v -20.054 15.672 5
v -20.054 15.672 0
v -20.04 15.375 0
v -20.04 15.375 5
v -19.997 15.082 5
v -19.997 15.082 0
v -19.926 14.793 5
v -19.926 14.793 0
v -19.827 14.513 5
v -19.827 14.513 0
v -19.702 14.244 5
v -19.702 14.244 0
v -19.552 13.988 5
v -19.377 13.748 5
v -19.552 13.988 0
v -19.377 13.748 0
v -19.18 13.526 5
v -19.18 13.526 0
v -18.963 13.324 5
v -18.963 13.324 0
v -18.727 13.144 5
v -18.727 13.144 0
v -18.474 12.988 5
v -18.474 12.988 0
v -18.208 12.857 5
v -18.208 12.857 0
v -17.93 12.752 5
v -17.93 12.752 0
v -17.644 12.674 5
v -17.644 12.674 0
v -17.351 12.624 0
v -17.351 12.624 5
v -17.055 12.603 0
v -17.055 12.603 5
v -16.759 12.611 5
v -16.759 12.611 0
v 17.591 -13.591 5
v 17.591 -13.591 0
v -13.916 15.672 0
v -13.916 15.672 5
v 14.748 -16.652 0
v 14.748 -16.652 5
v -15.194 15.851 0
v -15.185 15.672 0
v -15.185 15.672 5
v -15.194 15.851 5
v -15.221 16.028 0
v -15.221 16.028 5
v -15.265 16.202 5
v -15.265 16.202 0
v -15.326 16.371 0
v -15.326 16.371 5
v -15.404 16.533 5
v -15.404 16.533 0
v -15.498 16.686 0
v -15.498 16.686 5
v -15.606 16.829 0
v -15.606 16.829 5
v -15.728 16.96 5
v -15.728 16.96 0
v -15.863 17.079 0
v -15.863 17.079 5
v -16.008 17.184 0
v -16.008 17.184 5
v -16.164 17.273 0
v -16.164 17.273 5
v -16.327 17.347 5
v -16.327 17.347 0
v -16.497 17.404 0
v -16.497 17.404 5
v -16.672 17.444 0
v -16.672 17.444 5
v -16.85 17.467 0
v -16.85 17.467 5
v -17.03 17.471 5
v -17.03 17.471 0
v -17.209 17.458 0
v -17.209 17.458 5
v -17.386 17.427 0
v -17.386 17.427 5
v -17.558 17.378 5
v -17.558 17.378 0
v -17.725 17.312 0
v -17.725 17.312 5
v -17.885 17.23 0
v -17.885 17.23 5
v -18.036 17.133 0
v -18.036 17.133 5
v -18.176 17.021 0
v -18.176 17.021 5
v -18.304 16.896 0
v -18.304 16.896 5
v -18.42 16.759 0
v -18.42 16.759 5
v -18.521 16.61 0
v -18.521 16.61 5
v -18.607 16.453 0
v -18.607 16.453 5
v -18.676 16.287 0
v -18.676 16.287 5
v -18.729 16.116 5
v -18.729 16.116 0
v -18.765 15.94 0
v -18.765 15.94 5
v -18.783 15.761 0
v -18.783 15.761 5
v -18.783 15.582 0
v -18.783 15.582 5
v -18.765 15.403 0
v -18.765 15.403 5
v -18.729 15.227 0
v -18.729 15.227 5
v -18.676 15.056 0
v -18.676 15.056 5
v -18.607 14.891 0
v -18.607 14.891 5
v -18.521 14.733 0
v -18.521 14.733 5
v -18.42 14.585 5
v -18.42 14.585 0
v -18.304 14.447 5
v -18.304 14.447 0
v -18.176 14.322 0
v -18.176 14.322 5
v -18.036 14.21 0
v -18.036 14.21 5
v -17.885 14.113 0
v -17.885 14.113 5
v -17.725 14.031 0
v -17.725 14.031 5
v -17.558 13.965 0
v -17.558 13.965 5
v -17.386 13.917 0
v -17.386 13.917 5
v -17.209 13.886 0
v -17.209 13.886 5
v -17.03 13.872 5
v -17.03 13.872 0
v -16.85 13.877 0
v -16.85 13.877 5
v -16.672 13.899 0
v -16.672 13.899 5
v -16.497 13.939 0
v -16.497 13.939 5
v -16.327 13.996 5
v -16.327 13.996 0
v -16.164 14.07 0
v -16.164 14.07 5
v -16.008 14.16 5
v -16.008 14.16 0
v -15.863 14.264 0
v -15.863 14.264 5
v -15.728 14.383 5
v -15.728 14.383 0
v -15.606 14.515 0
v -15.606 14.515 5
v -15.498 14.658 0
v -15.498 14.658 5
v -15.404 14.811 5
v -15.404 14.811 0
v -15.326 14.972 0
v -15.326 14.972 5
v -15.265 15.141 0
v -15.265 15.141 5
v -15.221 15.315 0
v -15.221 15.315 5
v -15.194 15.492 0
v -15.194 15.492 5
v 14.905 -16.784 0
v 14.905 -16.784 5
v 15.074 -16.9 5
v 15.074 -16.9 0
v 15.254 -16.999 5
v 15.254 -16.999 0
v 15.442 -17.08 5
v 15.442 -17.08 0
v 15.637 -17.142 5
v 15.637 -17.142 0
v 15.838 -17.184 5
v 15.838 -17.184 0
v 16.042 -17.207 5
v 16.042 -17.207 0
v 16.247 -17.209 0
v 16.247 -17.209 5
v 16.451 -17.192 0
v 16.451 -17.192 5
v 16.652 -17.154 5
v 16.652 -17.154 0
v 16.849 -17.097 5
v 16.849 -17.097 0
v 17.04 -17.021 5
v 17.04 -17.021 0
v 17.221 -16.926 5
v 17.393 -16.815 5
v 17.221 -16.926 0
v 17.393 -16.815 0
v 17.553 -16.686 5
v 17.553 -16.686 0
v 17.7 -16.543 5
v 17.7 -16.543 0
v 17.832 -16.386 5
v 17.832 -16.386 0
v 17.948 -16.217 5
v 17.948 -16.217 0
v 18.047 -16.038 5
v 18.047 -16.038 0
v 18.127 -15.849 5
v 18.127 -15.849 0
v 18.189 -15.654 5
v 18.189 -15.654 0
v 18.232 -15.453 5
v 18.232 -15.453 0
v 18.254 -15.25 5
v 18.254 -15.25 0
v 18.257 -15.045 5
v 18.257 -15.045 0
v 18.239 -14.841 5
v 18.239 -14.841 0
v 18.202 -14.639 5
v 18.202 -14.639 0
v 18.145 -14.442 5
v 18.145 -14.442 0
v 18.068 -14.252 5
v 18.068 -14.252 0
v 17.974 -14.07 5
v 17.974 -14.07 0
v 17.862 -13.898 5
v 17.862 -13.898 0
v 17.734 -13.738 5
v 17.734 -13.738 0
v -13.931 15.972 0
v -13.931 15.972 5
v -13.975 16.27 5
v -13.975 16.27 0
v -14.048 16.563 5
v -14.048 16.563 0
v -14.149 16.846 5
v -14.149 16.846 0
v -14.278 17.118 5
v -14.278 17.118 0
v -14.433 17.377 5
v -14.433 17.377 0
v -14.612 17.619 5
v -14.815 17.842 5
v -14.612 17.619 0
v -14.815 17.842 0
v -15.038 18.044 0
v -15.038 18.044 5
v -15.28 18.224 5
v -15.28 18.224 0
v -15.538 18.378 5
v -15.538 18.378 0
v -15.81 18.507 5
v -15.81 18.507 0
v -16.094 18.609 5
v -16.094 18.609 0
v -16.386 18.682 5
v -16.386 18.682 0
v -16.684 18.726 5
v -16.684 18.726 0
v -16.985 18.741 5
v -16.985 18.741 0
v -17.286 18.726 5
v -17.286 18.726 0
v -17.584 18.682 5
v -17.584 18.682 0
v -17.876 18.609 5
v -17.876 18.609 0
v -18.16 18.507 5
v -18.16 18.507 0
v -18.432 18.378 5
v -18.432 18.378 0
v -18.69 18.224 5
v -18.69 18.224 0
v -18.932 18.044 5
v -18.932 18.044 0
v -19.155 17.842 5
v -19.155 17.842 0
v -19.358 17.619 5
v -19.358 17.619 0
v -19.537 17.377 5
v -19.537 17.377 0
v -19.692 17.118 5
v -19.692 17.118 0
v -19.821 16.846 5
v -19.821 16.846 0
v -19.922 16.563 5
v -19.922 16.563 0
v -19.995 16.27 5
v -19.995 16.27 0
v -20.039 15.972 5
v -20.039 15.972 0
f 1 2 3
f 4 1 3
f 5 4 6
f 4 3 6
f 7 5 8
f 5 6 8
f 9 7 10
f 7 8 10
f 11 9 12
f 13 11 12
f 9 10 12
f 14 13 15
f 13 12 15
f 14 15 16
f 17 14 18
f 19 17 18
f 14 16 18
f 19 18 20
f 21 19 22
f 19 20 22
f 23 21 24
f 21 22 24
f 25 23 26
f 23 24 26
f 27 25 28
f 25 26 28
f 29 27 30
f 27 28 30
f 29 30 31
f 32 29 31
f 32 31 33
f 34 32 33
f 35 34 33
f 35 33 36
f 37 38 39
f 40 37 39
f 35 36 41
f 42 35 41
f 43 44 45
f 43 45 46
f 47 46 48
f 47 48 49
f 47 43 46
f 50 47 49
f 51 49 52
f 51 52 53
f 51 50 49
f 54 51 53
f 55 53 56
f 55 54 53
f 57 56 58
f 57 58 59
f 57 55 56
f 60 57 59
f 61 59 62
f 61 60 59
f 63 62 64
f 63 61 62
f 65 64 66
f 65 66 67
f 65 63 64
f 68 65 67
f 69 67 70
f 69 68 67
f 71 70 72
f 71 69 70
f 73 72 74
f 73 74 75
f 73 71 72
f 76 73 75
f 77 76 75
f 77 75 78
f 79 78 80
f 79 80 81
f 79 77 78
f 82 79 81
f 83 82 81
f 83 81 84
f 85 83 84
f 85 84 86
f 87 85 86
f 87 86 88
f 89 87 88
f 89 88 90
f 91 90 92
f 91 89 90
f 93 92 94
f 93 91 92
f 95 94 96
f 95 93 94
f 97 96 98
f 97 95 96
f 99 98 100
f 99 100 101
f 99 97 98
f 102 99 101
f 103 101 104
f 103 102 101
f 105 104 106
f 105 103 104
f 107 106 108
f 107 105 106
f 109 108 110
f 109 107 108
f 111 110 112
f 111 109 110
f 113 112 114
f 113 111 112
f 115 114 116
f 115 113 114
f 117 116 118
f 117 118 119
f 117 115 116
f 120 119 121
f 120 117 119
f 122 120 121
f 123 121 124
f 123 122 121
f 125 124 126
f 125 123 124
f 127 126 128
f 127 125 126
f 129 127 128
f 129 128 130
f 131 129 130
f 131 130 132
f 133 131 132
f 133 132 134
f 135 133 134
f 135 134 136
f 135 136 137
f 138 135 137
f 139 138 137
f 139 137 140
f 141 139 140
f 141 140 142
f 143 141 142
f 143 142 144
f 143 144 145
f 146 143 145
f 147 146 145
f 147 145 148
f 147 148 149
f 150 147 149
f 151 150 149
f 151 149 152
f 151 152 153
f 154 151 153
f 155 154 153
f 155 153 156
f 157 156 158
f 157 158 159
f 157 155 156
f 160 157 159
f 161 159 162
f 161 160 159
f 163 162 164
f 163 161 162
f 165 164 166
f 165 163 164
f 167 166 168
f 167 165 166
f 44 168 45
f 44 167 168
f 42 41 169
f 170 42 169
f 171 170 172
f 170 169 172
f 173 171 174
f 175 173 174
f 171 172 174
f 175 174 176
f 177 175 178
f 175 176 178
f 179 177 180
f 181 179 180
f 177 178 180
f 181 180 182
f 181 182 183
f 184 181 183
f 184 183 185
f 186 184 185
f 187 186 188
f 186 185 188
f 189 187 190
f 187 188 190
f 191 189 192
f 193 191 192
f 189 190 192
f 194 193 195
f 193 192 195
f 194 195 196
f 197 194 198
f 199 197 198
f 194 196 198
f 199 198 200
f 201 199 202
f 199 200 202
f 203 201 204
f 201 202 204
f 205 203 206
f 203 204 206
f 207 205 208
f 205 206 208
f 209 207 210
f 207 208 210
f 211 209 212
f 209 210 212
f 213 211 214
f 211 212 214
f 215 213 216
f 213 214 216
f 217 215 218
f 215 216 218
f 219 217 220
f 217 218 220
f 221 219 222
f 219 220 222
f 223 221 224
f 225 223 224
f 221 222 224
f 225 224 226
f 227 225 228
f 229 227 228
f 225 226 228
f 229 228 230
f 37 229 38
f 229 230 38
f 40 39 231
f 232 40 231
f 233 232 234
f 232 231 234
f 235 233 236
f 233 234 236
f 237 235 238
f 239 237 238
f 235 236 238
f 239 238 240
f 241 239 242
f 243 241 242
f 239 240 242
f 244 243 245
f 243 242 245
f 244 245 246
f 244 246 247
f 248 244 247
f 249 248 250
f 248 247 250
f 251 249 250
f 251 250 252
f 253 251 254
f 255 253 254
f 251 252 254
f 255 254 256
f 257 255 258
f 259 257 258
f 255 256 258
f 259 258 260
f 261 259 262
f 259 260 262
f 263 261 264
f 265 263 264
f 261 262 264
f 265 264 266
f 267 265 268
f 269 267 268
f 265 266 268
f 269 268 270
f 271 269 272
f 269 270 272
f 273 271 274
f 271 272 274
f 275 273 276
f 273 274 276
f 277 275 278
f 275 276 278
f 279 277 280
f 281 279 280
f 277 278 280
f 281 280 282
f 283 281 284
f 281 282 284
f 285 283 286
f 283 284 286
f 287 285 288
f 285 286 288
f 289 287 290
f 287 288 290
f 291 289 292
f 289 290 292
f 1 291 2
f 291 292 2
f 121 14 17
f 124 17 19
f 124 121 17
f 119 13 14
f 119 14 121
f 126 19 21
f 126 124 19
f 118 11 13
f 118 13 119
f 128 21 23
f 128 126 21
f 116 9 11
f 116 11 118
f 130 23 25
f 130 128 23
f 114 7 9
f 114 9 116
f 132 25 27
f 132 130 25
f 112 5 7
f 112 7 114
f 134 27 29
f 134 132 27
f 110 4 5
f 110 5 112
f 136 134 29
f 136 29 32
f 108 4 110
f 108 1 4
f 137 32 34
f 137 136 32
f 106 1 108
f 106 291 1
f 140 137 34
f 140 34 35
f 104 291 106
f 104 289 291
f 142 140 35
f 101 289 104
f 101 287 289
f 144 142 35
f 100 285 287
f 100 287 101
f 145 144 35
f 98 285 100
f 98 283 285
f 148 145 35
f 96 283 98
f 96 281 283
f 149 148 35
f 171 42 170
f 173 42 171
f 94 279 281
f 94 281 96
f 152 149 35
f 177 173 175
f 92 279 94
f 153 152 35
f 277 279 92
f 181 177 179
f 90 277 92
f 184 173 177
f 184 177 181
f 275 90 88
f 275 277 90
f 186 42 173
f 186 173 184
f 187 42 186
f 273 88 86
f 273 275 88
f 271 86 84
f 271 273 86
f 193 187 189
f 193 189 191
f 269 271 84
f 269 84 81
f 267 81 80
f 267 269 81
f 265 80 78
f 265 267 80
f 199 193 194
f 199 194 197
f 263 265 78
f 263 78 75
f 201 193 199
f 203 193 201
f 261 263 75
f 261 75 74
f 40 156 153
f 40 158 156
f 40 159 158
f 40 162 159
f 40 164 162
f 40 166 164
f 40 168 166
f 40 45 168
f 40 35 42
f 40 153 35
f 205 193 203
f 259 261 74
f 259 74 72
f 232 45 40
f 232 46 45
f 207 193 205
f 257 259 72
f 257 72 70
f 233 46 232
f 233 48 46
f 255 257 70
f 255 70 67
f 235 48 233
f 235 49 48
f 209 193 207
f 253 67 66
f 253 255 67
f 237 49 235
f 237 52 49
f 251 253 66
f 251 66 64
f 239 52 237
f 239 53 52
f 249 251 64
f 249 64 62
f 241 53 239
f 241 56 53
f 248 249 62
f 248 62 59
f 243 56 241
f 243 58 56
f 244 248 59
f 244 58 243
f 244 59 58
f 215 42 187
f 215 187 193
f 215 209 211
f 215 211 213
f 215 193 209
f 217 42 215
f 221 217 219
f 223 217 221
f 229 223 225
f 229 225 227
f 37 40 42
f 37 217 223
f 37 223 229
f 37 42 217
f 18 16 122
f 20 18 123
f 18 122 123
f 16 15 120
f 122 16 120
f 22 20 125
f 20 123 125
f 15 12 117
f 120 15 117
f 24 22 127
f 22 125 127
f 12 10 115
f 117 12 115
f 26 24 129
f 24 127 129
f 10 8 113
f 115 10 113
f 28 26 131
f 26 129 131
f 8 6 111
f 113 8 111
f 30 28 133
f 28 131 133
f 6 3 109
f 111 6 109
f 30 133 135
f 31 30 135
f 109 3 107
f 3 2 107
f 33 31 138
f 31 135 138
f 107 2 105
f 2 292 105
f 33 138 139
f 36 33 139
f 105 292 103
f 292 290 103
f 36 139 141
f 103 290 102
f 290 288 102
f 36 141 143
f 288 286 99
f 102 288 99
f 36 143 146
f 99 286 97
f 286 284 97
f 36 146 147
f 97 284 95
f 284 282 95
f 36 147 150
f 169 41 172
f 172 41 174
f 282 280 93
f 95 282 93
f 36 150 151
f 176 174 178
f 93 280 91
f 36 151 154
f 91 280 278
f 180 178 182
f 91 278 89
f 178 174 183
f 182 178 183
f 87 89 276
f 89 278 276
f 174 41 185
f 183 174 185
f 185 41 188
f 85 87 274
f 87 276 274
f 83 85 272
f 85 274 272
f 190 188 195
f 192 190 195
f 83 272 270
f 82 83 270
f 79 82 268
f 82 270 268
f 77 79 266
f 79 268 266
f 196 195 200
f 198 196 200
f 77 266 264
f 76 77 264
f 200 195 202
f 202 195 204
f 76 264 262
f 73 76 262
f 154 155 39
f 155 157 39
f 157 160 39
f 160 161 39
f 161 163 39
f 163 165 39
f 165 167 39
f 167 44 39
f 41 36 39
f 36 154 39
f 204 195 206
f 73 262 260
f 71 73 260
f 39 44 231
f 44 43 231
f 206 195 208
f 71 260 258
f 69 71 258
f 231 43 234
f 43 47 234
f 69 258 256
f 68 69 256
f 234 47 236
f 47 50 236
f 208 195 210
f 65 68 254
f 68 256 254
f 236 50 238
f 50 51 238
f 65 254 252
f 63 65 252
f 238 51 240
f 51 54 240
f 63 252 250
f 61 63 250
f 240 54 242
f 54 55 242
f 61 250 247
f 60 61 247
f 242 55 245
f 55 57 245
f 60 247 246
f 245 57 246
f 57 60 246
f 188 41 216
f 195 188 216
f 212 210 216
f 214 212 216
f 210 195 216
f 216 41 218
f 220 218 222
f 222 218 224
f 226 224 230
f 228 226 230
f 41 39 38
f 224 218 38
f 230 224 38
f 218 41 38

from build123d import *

# Parameters (mm, degrees)
ESQUISSE2_R        = 1.8
BOSS_EXTRU_2_DEPTH = 5


with BuildPart() as part:
    # Esquisse2 → Boss.-Extru.2 (new body)
    with BuildSketch(Plane.XY):
        with BuildLine():
            Line((17.591007248, -13.591370514), (-13.915745379, 15.671652893))
            ThreePointArc((-13.915745379, 15.671652893), (-14.736105314, 13.582929731), (-16.758645601, 12.610774569))
            Line((-16.758645601, 12.610774569), (14.748107026, -16.652248837))
            ThreePointArc((14.748107026, -16.652248837), (17.699996299, -16.543259786), (17.591007248, -13.591370514))
        make_face()
        with BuildLine():
            Line((-16.758645601, 12.610774569), (-20.0542154, 15.671652893))
            ThreePointArc((-20.0542154, 15.671652893), (-19.073703551, 13.422777818), (-16.758645601, 12.610774569))
        make_face()
        with BuildLine():
            ThreePointArc((-16.758645601, 12.610774569), (-14.736105314, 13.582929731), (-13.915745379, 15.671652893))
            ThreePointArc((-13.915745379, 15.671652893), (-16.984980389, 18.740887903), (-20.0542154, 15.671652893))
            Line((-20.0542154, 15.671652893), (-16.758645601, 12.610774569))
        make_face()
        with Locations((-16.984980389, 15.671652893)):
            Circle(ESQUISSE2_R, mode=Mode.SUBTRACT)
    extrude(amount=BOSS_EXTRU_2_DEPTH)


solid = part.part
